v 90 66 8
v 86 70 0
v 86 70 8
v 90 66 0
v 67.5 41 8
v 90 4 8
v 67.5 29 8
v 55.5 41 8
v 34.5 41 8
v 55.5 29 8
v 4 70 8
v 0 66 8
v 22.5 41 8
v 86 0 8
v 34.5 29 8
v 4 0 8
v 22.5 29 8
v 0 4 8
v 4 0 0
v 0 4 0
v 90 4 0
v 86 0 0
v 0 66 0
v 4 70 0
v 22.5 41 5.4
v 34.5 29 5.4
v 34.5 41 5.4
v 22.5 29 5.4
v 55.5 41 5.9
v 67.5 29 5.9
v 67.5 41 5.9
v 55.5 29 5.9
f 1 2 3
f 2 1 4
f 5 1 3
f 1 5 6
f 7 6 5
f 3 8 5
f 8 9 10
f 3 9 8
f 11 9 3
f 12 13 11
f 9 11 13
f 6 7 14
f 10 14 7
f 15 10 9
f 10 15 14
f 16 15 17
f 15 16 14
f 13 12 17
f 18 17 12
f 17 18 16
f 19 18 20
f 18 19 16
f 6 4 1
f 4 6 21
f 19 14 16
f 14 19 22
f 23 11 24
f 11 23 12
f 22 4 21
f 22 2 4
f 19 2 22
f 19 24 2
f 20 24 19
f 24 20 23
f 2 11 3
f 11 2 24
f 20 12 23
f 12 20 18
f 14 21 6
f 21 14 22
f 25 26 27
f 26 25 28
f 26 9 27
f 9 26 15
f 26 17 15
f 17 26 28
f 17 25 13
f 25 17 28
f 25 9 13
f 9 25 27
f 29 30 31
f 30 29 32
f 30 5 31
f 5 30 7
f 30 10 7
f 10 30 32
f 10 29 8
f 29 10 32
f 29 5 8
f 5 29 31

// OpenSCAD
$fn = 32;

// ----------------------------------------------------------------------
// Windowed plate: 2 voids, 90 x 70 x 8 mm
// ----------------------------------------------------------------------

// --- parameters (mm) ---
plate_l = 90;             // plate length, X
plate_w = 70;             // plate width, Y
plate_t = 8;              // plate thickness, Z
edge_margin = 12;         // wall from the plate edge to any window
windows = 2;              // number of windows in the row
win_l = 12;               // window length
win_w = 12;               // window width
win_pitch = 33;           // window pitch along X
depth_1 = 2.6;            // depth of void 1 (full thickness = through)
depth_2 = 2.1;            // depth of void 2 (full thickness = through)
corner_c = 4;             // corner chamfer of the plate

profile = [[4, 0], [86, 0], [90, 4], [90, 66], [86, 70], [4, 70], [0, 66], [0, 4]];  // primary outline, 8 points, counter clockwise
void_1 = [[22.5, 29], [34.5, 29], [34.5, 41], [22.5, 41]];  // window 1 of the row, 4 points
void_2 = [[55.5, 29], [67.5, 29], [67.5, 41], [55.5, 41]];  // window 2 of the row, 4 points

// --- the one profile operation ---
difference() {
  linear_extrude(height = plate_t) polygon(points = profile);
  translate([0, 0, plate_t - depth_1])
    linear_extrude(height = depth_1 + 1) polygon(points = void_1);
  translate([0, 0, plate_t - depth_2])
    linear_extrude(height = depth_2 + 1) polygon(points = void_2);
}
